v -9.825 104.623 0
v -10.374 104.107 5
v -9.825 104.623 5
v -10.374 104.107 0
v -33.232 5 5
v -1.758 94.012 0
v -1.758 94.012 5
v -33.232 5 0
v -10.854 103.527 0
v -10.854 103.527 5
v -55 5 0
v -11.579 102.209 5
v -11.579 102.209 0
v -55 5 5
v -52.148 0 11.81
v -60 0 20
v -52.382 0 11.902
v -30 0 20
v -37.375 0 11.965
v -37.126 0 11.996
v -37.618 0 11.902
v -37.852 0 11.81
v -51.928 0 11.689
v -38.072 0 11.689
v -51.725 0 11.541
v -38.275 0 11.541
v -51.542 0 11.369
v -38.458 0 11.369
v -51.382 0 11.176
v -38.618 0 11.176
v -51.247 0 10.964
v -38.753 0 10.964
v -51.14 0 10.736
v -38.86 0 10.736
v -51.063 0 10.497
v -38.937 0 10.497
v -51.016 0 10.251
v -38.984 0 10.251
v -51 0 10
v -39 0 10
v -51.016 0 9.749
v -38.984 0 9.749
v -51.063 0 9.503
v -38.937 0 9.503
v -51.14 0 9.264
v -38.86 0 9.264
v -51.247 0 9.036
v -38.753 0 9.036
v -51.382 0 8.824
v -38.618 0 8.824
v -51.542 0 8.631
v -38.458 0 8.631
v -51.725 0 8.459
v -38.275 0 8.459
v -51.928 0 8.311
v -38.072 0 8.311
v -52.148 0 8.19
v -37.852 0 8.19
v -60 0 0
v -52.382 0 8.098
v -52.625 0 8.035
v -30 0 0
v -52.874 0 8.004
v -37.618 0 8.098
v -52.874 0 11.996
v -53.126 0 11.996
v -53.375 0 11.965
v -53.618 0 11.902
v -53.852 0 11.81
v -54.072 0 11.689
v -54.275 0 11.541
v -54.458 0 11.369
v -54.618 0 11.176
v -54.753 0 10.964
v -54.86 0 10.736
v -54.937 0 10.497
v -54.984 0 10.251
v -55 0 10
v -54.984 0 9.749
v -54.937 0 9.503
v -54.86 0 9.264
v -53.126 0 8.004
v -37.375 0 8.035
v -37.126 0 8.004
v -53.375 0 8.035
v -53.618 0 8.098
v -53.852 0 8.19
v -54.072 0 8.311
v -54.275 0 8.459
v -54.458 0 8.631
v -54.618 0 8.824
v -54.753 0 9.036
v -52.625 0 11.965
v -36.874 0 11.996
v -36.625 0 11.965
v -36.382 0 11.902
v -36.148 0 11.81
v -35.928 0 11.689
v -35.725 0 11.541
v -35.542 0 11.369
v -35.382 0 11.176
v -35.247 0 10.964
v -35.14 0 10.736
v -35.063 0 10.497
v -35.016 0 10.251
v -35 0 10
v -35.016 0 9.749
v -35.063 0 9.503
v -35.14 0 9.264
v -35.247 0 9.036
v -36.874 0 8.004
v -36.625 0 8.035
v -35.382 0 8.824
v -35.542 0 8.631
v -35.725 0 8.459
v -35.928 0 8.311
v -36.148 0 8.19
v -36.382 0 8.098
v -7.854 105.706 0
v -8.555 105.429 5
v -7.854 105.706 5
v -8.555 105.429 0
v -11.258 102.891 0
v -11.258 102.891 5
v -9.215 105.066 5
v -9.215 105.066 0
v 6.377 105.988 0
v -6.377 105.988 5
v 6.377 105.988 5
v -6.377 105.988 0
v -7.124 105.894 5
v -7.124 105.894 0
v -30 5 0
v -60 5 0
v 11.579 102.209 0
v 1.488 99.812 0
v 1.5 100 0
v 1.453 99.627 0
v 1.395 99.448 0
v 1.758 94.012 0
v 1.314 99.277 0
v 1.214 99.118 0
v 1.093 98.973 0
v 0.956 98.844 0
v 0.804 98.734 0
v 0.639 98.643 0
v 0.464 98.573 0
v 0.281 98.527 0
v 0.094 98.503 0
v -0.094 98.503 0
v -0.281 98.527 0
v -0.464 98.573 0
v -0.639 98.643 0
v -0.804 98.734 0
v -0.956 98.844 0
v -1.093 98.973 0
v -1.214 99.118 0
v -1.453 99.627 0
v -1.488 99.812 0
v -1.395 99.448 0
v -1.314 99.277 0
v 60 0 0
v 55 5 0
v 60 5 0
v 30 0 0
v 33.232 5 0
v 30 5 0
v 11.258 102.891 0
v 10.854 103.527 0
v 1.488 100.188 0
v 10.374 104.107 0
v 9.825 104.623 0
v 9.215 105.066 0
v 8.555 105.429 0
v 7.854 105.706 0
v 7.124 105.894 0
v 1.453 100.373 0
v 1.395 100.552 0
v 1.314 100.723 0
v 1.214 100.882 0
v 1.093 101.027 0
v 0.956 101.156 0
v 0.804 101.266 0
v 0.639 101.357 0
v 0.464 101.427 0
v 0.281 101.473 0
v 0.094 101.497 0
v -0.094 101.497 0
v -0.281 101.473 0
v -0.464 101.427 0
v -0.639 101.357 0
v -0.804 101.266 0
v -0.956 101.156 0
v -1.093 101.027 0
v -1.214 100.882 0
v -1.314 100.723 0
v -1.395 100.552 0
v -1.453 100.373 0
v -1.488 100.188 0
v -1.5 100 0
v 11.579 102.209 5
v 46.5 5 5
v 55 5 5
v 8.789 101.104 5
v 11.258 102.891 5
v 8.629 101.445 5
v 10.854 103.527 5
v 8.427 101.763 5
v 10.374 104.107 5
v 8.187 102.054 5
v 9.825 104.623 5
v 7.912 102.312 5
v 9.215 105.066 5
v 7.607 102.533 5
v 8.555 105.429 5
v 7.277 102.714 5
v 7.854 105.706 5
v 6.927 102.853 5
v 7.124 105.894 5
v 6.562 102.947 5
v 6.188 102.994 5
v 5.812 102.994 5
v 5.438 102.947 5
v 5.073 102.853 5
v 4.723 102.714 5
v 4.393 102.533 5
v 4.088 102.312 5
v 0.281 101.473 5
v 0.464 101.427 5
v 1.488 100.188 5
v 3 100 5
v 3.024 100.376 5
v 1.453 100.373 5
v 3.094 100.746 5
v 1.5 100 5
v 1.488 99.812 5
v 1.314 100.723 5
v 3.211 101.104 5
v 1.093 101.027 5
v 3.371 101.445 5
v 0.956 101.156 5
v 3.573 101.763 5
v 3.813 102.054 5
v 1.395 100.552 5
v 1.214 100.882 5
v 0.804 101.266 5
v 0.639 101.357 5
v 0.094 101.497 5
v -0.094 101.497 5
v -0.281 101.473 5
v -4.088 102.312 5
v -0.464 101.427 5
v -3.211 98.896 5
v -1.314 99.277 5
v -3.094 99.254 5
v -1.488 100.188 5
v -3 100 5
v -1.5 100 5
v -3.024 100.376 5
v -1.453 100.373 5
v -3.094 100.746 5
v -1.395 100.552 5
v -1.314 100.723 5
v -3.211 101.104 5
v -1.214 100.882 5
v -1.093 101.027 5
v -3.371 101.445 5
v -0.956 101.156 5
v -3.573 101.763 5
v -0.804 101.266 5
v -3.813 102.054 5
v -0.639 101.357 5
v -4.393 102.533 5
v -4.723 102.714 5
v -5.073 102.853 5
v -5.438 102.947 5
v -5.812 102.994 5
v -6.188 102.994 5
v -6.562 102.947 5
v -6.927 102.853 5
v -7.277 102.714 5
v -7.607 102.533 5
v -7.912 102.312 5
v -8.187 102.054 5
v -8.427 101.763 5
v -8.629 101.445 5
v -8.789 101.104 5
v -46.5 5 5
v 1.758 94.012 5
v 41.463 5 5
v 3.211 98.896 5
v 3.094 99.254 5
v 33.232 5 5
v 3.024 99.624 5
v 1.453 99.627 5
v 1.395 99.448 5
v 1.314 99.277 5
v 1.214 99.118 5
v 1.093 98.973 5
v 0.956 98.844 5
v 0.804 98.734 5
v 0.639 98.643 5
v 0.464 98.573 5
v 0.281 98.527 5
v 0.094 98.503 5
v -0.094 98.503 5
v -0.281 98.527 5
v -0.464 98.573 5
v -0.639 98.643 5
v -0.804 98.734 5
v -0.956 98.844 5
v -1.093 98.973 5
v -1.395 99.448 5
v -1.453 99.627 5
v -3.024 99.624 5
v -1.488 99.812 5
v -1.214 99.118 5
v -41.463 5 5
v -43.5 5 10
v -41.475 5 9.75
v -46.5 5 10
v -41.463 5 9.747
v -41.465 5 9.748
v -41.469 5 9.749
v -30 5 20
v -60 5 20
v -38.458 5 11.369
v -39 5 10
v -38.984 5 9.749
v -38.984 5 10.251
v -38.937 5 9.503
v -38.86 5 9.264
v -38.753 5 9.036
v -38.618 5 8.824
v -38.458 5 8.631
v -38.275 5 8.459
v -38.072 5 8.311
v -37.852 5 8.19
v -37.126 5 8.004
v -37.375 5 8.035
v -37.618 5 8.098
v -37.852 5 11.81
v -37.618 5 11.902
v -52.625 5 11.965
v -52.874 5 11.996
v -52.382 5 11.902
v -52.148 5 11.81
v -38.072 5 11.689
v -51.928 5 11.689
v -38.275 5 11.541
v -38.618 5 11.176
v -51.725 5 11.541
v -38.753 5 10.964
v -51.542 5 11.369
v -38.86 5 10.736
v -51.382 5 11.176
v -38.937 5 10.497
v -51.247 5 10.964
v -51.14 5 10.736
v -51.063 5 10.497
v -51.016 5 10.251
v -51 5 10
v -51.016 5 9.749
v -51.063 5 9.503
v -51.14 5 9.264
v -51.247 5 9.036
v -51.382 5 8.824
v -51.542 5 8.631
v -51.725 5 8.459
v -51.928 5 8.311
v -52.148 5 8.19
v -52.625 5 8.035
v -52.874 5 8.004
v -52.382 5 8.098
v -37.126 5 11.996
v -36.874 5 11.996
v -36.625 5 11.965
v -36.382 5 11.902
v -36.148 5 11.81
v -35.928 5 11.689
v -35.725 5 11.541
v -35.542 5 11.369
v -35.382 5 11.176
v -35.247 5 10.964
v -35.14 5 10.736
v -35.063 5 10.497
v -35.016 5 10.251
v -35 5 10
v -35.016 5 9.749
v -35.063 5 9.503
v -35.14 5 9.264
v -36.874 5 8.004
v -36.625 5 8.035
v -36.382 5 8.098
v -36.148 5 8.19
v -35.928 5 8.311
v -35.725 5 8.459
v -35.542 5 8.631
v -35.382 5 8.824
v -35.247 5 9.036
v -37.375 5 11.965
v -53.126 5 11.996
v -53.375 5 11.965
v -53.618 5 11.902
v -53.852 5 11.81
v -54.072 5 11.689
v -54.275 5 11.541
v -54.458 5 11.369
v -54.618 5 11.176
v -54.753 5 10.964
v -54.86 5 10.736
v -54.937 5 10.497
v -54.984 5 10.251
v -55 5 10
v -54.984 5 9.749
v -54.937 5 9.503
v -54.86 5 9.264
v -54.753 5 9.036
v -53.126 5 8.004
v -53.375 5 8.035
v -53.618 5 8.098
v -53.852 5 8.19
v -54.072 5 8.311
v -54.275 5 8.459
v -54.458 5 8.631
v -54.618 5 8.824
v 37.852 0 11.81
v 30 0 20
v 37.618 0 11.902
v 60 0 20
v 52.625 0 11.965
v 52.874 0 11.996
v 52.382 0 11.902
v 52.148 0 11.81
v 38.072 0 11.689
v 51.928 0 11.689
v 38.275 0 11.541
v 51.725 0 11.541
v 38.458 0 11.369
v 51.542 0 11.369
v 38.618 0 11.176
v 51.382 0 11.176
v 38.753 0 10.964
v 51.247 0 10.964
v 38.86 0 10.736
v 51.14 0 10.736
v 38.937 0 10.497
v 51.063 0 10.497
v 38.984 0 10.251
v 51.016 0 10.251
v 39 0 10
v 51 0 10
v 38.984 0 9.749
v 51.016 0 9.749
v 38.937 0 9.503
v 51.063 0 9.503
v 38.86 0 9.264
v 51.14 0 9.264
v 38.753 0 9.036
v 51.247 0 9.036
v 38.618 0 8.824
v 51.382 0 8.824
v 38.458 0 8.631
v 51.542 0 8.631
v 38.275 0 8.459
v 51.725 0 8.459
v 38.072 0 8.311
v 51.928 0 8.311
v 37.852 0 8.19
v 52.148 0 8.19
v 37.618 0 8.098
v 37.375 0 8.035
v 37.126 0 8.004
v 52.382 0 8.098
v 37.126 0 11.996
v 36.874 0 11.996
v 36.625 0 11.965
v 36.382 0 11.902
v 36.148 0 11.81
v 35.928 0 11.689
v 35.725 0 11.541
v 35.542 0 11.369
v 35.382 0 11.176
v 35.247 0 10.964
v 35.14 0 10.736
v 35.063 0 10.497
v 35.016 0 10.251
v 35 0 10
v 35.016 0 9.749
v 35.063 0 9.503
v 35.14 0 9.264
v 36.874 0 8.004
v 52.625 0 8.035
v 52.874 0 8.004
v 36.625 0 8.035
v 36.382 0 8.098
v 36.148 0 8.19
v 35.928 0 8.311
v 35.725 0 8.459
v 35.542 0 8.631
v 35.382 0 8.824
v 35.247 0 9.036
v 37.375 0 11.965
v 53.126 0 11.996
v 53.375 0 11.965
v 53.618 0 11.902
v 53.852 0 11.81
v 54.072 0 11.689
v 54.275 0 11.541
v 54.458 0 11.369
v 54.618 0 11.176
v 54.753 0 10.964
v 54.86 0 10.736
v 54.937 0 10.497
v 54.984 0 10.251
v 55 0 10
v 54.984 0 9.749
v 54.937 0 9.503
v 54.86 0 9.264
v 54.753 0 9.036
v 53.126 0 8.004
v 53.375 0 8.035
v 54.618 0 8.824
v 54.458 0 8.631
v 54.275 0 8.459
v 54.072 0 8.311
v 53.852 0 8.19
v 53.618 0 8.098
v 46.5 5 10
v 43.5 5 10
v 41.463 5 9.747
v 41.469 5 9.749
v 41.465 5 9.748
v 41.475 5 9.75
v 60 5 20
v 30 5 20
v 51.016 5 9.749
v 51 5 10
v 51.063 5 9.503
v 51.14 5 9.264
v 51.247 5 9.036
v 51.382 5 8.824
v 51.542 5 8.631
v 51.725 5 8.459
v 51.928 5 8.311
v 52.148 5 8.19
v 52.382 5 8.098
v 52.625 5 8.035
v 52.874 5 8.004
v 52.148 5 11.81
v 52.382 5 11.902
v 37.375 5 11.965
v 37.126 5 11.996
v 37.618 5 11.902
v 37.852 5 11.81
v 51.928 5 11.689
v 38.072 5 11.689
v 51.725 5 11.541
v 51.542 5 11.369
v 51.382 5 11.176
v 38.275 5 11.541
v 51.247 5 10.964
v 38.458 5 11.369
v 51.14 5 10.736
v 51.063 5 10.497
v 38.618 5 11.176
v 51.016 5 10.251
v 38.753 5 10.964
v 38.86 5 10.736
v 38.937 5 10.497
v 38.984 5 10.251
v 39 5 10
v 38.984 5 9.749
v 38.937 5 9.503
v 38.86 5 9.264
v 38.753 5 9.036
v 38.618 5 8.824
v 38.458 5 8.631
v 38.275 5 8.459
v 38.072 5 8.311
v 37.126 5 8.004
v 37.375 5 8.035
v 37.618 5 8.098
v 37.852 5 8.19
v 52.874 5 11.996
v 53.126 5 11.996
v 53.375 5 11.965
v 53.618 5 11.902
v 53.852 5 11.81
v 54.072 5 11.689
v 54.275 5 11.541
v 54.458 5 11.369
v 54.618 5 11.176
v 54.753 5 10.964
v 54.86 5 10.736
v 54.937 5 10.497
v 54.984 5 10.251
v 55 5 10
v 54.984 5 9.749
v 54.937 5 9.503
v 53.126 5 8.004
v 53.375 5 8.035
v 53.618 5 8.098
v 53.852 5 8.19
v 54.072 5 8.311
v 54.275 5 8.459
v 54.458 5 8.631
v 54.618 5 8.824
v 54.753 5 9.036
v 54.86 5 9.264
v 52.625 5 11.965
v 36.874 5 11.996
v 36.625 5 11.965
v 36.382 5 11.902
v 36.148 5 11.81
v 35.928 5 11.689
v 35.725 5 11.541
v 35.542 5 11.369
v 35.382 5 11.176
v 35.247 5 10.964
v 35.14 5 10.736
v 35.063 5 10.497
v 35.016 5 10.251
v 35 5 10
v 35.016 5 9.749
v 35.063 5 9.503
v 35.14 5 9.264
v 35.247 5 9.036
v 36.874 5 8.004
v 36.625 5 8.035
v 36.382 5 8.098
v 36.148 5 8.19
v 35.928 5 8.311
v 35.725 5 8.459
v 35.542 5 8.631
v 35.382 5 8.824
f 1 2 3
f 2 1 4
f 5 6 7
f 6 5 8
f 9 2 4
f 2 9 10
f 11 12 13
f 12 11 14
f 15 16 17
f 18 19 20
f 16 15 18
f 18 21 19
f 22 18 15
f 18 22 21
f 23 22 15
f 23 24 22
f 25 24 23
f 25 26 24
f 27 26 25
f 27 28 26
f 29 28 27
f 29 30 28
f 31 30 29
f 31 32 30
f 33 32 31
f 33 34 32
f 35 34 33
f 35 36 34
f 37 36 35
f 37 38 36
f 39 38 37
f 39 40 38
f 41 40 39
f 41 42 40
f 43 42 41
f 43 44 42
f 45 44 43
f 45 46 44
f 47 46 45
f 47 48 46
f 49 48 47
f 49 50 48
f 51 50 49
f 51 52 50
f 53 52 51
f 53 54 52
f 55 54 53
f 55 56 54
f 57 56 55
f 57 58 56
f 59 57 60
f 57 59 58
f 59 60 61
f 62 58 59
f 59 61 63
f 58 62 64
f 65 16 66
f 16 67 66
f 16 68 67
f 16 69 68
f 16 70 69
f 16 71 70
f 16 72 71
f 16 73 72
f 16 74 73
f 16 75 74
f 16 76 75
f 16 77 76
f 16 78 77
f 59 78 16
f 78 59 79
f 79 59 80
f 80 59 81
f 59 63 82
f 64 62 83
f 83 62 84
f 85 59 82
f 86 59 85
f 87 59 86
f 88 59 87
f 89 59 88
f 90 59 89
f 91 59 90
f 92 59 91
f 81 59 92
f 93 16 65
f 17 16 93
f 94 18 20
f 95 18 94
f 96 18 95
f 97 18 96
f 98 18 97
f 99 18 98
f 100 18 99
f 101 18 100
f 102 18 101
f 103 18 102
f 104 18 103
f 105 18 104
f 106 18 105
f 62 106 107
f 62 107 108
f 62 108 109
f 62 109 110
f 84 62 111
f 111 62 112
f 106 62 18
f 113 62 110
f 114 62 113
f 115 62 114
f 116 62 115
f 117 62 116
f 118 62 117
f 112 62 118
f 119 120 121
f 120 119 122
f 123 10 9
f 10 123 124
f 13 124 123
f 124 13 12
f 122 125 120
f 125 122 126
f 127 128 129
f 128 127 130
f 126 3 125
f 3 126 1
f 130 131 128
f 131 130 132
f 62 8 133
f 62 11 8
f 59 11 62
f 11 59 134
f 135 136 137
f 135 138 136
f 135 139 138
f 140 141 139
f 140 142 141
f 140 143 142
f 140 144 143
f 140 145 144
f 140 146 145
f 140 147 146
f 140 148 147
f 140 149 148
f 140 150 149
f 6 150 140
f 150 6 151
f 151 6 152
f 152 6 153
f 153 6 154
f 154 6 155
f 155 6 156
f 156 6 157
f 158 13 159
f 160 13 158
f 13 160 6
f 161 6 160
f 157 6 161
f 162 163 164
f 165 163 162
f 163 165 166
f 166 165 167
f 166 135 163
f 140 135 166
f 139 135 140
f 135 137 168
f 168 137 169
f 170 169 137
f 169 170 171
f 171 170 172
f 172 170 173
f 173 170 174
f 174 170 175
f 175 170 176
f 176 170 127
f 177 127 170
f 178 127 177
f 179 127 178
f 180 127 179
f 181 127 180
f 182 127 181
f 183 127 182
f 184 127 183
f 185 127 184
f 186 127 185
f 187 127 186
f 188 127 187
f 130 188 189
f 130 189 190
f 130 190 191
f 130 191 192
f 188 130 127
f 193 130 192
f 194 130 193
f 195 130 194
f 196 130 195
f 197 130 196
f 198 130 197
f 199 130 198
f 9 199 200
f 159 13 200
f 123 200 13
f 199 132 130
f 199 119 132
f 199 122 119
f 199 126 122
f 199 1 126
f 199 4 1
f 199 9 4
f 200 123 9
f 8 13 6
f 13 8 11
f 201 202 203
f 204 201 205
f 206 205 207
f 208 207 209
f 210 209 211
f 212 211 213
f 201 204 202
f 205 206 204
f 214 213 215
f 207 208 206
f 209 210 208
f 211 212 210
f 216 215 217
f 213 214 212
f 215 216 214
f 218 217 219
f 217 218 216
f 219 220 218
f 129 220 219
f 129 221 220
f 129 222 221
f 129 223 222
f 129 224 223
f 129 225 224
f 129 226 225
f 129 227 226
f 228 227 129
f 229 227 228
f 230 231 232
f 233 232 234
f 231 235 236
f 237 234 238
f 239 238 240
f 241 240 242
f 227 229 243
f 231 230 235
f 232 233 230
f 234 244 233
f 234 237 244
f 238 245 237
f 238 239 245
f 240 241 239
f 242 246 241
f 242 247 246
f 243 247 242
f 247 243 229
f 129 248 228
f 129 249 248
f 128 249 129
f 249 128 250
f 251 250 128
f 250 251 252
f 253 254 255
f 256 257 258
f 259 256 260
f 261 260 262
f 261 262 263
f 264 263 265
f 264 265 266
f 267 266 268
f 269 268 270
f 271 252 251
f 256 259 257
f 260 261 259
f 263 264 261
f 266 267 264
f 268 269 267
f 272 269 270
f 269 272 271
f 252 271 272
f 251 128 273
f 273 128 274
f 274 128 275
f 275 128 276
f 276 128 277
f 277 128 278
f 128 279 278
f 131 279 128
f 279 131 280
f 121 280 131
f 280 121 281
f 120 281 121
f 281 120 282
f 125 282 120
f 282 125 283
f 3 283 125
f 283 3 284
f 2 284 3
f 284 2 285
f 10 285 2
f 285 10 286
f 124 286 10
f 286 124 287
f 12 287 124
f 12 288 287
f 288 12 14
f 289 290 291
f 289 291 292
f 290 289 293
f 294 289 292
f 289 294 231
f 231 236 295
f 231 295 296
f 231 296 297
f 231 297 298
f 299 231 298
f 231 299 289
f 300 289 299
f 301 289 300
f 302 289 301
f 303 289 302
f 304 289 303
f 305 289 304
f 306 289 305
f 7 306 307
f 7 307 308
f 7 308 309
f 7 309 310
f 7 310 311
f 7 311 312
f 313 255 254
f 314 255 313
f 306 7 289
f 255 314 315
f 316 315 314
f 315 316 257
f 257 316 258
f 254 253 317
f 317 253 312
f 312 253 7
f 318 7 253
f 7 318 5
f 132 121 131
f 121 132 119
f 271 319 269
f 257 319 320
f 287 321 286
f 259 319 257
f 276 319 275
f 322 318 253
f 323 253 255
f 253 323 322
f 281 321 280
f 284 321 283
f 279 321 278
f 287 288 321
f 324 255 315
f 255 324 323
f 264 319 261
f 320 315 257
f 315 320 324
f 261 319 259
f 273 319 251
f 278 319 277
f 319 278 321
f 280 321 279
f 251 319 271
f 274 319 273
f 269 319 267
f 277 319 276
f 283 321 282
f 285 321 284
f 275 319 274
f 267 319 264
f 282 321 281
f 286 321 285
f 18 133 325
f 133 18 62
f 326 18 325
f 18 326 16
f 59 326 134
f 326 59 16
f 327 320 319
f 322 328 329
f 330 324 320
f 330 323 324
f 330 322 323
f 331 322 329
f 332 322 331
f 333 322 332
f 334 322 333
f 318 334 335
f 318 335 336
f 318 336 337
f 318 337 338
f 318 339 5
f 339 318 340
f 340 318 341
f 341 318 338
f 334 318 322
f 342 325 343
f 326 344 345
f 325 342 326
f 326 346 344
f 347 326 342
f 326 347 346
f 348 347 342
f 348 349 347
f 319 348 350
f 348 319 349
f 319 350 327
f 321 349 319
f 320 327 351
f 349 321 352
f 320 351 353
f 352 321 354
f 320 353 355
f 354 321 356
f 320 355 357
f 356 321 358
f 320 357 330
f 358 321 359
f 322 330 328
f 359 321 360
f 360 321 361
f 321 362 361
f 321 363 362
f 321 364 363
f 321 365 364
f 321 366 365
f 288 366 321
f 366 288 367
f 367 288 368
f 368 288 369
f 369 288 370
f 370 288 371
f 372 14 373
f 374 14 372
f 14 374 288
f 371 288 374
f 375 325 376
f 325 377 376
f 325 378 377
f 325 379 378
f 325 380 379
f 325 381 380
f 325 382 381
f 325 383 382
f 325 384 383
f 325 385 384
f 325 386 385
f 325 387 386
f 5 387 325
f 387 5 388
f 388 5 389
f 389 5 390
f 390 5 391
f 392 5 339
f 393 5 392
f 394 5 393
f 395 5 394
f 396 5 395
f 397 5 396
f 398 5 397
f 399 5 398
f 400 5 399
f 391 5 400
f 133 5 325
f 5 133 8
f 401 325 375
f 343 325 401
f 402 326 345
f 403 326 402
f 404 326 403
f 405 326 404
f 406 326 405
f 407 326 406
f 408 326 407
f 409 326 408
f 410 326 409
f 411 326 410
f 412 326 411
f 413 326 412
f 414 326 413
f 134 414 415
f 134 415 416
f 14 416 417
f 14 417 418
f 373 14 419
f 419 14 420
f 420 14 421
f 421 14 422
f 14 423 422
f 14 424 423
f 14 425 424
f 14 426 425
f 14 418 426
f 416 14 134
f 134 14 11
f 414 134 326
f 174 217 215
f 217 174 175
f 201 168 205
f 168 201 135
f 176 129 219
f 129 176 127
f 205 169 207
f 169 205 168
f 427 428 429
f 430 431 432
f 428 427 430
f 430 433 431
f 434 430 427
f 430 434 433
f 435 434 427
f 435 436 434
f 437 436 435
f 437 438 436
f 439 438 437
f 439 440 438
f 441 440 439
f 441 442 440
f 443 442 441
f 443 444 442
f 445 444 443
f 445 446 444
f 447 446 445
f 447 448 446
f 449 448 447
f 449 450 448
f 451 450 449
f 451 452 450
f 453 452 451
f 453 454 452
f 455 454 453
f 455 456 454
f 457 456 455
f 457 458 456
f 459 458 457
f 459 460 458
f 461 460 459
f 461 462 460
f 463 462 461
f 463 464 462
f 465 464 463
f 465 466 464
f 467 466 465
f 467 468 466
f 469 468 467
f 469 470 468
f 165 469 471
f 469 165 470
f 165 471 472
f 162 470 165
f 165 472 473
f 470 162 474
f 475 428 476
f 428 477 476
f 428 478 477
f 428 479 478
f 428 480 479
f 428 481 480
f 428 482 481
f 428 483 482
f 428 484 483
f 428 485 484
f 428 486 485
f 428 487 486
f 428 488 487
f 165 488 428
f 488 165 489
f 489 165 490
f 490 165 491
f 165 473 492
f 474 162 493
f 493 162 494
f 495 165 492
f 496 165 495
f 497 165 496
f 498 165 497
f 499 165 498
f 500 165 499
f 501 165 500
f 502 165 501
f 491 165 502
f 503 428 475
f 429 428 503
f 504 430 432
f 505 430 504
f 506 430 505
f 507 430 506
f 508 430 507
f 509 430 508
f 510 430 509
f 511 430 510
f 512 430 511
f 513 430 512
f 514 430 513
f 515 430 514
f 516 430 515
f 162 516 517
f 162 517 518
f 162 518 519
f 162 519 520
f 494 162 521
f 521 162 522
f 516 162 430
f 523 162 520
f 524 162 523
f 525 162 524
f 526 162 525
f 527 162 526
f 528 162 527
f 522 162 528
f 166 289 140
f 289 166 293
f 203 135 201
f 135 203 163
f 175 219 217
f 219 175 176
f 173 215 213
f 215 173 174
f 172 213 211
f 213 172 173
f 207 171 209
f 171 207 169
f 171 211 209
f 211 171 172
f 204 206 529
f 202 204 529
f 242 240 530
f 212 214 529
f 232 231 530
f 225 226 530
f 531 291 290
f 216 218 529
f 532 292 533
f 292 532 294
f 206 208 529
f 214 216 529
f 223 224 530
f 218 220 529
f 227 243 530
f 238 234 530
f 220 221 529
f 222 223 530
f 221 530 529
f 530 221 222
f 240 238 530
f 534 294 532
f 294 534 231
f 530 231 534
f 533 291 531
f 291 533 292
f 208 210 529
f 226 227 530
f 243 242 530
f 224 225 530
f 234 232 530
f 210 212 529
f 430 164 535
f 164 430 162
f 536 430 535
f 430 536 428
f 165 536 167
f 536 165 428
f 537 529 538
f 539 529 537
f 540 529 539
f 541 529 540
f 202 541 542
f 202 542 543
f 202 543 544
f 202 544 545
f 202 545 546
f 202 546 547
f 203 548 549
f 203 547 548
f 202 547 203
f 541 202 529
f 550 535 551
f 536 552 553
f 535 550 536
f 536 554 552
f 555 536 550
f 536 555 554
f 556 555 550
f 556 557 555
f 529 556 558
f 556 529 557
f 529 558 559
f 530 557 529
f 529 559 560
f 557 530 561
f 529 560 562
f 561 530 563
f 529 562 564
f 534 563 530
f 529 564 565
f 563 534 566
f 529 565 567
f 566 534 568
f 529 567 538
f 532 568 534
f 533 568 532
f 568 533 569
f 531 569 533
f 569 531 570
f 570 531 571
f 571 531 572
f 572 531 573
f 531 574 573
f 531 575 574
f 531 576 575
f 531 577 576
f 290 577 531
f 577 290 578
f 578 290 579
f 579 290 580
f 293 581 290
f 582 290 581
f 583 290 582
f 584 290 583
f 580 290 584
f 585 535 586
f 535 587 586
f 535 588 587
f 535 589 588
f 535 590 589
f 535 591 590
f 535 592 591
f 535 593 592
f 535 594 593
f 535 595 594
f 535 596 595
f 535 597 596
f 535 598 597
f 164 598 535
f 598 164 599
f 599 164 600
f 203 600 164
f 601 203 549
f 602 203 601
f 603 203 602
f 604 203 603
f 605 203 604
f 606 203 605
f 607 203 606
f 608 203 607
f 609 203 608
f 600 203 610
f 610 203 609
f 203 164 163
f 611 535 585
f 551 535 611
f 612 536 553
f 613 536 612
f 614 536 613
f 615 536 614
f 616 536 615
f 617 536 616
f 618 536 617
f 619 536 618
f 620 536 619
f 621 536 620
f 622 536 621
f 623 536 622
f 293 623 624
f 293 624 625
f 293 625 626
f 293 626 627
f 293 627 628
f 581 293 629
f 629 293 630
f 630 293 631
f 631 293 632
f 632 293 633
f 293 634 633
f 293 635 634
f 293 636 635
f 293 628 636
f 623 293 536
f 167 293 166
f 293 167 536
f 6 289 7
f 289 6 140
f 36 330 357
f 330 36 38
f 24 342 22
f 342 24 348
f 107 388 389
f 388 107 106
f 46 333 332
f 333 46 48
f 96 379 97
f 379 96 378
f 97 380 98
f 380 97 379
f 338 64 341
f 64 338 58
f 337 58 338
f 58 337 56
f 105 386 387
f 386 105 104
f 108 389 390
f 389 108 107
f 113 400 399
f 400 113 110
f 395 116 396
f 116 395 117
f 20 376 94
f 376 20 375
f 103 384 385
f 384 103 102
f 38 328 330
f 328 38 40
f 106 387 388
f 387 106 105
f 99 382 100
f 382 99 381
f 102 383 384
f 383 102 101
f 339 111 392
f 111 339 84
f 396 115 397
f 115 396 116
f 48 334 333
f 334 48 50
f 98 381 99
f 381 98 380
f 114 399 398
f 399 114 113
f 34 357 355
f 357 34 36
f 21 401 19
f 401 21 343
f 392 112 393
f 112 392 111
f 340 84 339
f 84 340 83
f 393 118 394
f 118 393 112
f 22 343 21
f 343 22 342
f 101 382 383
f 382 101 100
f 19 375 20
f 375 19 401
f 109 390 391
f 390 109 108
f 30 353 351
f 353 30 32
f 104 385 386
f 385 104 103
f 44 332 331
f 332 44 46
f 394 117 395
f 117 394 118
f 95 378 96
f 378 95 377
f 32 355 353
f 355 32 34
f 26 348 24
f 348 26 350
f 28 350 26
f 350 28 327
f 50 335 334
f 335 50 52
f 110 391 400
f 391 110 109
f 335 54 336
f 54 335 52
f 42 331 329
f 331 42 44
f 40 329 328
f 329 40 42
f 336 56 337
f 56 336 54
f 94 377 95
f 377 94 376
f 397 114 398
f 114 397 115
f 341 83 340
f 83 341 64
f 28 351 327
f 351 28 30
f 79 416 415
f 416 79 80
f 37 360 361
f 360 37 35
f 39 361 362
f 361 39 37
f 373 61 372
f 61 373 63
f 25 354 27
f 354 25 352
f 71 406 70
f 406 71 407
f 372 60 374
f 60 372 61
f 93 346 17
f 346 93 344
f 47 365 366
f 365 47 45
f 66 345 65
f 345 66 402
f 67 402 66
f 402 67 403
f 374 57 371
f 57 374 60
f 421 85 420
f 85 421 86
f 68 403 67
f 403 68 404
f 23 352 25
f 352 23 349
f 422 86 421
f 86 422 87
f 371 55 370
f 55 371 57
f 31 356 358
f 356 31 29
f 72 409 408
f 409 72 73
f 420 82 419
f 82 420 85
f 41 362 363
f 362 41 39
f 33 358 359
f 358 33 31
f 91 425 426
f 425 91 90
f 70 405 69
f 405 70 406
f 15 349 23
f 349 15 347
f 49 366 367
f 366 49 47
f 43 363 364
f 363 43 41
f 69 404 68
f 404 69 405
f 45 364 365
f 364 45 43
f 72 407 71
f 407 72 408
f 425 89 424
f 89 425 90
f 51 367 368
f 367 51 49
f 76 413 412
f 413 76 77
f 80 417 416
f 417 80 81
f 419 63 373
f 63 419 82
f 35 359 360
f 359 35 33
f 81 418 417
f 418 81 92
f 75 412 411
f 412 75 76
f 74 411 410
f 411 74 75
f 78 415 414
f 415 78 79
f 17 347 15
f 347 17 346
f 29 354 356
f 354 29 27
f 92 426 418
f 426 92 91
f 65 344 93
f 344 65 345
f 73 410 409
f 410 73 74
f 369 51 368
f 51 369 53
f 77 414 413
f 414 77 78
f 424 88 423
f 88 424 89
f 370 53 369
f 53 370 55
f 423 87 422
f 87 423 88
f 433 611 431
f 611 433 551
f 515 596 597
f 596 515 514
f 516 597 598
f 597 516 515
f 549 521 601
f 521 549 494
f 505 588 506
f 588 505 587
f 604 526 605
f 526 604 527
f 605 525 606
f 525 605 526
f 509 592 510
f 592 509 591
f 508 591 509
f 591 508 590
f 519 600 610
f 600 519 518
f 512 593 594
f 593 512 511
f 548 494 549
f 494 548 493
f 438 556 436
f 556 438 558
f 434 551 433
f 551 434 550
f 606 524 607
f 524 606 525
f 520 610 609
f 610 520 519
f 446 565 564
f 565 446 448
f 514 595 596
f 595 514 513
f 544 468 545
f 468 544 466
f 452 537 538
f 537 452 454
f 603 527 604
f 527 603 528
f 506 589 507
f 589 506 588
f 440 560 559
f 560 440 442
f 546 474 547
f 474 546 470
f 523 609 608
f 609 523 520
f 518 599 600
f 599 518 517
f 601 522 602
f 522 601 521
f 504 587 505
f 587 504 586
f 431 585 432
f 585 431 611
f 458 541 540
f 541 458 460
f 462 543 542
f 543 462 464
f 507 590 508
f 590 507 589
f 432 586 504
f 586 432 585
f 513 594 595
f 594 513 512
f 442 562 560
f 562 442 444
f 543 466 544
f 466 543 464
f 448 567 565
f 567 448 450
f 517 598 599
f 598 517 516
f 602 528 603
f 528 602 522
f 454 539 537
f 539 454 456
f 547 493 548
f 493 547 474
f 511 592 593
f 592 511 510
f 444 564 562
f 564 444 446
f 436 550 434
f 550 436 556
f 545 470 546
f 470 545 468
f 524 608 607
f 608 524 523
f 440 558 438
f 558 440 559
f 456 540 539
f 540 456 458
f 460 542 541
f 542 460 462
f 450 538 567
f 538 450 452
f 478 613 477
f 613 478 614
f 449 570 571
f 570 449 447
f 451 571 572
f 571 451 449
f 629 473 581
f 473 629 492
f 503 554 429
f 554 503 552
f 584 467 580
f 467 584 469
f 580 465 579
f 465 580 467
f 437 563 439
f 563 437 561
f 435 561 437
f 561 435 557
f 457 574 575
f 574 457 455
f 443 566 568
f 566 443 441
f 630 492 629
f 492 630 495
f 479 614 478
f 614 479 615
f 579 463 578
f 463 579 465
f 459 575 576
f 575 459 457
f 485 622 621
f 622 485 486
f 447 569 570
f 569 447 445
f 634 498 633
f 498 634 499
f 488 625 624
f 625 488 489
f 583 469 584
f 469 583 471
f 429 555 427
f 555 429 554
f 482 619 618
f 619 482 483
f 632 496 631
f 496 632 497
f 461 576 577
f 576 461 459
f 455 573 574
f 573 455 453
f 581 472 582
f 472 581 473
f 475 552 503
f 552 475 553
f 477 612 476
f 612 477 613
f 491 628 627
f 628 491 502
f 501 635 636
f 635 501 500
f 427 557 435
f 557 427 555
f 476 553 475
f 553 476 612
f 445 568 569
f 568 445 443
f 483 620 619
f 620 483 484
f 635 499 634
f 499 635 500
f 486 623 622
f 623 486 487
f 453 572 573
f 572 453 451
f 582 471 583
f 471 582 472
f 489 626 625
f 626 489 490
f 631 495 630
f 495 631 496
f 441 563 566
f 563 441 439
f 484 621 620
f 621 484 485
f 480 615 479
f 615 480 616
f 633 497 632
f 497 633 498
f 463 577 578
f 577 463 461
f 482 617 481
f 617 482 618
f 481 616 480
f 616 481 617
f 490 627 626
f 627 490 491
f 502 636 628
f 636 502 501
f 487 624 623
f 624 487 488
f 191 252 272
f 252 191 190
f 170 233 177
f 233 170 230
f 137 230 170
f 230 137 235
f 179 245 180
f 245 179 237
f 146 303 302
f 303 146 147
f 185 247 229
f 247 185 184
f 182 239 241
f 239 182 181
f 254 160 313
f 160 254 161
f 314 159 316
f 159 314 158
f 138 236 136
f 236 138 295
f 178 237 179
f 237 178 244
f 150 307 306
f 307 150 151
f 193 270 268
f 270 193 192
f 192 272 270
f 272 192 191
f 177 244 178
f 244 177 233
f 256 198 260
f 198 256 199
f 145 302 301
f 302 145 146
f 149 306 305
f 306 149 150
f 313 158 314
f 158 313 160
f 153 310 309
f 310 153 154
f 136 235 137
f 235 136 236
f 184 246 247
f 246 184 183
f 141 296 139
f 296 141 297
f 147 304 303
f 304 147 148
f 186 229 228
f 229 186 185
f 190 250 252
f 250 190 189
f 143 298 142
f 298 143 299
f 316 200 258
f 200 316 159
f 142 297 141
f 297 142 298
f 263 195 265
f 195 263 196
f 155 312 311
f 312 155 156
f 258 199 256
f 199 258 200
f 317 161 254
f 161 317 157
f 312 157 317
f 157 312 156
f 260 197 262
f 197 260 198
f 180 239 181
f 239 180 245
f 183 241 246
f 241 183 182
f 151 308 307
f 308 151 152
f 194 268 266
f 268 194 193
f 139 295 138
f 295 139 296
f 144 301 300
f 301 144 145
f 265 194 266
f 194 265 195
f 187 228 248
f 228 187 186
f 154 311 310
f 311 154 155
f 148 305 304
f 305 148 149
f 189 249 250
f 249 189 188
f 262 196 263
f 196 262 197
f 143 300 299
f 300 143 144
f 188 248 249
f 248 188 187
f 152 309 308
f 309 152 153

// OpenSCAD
// file: ../parameters.scad
ears_distance = 72;
ears_width = 2;
ears_hole_width = ears_width + 1;
ears_length = 8;
ears_height = 10;
ears_hole_from_bottom = 5;

release_length = 20;
release_thickness = 3;

beam_diameter = 6;


servo_thickness = 13;
servo_length = 23;
servo_holes_diameter = 2;
servo_holes_distance = 27;
servo_axis_offset = 5.5;
// main file
include <../parameters.scad>

$fn=50;


foot_distance = 90;

module 888_1002(){

	difference(){

		union(){


			for(i=[-1, 1]){ 

				hull(){
					translate([foot_distance/2*i - 10, 0, 0])
						cube([20, 5, 5]);
					translate([beam_diameter*i, 100, 0])
						cylinder(d = beam_diameter+6, h = 5);
				}


				hull(){
					translate([foot_distance/2*i - 1.5, 0, 0])
						cube([3, 5, 10]);
					translate([beam_diameter*i, 100, 0])
						cylinder(d = beam_diameter, h = 5);
				}

				translate([foot_distance/2*i - 15, 0, 0])
					//cylinder(d = beam_diameter+6, h = 5);
					cube([30, 5, 20]);
			}

			hull(){
				translate([beam_diameter*1, 100, 0])
					cylinder(d = beam_diameter+6, h = 5);
				translate([beam_diameter*-1, 100, 0])
					cylinder(d = beam_diameter+6, h = 5);
			}

		}


			for(i=[-1, 1]) {
				translate([foot_distance/2*i+8, 0, 10])
					rotate([90, 0, 0]) cylinder(d = 4, h = 15, center = true);
				translate([foot_distance/2*i-8, 0, 10])
					rotate([90, 0, 0]) cylinder(d = 4, h = 15, center = true);
			}

			translate([0, 100, -0.5])
				cylinder(d = 3, h = 6);


	}



}


888_1002();
